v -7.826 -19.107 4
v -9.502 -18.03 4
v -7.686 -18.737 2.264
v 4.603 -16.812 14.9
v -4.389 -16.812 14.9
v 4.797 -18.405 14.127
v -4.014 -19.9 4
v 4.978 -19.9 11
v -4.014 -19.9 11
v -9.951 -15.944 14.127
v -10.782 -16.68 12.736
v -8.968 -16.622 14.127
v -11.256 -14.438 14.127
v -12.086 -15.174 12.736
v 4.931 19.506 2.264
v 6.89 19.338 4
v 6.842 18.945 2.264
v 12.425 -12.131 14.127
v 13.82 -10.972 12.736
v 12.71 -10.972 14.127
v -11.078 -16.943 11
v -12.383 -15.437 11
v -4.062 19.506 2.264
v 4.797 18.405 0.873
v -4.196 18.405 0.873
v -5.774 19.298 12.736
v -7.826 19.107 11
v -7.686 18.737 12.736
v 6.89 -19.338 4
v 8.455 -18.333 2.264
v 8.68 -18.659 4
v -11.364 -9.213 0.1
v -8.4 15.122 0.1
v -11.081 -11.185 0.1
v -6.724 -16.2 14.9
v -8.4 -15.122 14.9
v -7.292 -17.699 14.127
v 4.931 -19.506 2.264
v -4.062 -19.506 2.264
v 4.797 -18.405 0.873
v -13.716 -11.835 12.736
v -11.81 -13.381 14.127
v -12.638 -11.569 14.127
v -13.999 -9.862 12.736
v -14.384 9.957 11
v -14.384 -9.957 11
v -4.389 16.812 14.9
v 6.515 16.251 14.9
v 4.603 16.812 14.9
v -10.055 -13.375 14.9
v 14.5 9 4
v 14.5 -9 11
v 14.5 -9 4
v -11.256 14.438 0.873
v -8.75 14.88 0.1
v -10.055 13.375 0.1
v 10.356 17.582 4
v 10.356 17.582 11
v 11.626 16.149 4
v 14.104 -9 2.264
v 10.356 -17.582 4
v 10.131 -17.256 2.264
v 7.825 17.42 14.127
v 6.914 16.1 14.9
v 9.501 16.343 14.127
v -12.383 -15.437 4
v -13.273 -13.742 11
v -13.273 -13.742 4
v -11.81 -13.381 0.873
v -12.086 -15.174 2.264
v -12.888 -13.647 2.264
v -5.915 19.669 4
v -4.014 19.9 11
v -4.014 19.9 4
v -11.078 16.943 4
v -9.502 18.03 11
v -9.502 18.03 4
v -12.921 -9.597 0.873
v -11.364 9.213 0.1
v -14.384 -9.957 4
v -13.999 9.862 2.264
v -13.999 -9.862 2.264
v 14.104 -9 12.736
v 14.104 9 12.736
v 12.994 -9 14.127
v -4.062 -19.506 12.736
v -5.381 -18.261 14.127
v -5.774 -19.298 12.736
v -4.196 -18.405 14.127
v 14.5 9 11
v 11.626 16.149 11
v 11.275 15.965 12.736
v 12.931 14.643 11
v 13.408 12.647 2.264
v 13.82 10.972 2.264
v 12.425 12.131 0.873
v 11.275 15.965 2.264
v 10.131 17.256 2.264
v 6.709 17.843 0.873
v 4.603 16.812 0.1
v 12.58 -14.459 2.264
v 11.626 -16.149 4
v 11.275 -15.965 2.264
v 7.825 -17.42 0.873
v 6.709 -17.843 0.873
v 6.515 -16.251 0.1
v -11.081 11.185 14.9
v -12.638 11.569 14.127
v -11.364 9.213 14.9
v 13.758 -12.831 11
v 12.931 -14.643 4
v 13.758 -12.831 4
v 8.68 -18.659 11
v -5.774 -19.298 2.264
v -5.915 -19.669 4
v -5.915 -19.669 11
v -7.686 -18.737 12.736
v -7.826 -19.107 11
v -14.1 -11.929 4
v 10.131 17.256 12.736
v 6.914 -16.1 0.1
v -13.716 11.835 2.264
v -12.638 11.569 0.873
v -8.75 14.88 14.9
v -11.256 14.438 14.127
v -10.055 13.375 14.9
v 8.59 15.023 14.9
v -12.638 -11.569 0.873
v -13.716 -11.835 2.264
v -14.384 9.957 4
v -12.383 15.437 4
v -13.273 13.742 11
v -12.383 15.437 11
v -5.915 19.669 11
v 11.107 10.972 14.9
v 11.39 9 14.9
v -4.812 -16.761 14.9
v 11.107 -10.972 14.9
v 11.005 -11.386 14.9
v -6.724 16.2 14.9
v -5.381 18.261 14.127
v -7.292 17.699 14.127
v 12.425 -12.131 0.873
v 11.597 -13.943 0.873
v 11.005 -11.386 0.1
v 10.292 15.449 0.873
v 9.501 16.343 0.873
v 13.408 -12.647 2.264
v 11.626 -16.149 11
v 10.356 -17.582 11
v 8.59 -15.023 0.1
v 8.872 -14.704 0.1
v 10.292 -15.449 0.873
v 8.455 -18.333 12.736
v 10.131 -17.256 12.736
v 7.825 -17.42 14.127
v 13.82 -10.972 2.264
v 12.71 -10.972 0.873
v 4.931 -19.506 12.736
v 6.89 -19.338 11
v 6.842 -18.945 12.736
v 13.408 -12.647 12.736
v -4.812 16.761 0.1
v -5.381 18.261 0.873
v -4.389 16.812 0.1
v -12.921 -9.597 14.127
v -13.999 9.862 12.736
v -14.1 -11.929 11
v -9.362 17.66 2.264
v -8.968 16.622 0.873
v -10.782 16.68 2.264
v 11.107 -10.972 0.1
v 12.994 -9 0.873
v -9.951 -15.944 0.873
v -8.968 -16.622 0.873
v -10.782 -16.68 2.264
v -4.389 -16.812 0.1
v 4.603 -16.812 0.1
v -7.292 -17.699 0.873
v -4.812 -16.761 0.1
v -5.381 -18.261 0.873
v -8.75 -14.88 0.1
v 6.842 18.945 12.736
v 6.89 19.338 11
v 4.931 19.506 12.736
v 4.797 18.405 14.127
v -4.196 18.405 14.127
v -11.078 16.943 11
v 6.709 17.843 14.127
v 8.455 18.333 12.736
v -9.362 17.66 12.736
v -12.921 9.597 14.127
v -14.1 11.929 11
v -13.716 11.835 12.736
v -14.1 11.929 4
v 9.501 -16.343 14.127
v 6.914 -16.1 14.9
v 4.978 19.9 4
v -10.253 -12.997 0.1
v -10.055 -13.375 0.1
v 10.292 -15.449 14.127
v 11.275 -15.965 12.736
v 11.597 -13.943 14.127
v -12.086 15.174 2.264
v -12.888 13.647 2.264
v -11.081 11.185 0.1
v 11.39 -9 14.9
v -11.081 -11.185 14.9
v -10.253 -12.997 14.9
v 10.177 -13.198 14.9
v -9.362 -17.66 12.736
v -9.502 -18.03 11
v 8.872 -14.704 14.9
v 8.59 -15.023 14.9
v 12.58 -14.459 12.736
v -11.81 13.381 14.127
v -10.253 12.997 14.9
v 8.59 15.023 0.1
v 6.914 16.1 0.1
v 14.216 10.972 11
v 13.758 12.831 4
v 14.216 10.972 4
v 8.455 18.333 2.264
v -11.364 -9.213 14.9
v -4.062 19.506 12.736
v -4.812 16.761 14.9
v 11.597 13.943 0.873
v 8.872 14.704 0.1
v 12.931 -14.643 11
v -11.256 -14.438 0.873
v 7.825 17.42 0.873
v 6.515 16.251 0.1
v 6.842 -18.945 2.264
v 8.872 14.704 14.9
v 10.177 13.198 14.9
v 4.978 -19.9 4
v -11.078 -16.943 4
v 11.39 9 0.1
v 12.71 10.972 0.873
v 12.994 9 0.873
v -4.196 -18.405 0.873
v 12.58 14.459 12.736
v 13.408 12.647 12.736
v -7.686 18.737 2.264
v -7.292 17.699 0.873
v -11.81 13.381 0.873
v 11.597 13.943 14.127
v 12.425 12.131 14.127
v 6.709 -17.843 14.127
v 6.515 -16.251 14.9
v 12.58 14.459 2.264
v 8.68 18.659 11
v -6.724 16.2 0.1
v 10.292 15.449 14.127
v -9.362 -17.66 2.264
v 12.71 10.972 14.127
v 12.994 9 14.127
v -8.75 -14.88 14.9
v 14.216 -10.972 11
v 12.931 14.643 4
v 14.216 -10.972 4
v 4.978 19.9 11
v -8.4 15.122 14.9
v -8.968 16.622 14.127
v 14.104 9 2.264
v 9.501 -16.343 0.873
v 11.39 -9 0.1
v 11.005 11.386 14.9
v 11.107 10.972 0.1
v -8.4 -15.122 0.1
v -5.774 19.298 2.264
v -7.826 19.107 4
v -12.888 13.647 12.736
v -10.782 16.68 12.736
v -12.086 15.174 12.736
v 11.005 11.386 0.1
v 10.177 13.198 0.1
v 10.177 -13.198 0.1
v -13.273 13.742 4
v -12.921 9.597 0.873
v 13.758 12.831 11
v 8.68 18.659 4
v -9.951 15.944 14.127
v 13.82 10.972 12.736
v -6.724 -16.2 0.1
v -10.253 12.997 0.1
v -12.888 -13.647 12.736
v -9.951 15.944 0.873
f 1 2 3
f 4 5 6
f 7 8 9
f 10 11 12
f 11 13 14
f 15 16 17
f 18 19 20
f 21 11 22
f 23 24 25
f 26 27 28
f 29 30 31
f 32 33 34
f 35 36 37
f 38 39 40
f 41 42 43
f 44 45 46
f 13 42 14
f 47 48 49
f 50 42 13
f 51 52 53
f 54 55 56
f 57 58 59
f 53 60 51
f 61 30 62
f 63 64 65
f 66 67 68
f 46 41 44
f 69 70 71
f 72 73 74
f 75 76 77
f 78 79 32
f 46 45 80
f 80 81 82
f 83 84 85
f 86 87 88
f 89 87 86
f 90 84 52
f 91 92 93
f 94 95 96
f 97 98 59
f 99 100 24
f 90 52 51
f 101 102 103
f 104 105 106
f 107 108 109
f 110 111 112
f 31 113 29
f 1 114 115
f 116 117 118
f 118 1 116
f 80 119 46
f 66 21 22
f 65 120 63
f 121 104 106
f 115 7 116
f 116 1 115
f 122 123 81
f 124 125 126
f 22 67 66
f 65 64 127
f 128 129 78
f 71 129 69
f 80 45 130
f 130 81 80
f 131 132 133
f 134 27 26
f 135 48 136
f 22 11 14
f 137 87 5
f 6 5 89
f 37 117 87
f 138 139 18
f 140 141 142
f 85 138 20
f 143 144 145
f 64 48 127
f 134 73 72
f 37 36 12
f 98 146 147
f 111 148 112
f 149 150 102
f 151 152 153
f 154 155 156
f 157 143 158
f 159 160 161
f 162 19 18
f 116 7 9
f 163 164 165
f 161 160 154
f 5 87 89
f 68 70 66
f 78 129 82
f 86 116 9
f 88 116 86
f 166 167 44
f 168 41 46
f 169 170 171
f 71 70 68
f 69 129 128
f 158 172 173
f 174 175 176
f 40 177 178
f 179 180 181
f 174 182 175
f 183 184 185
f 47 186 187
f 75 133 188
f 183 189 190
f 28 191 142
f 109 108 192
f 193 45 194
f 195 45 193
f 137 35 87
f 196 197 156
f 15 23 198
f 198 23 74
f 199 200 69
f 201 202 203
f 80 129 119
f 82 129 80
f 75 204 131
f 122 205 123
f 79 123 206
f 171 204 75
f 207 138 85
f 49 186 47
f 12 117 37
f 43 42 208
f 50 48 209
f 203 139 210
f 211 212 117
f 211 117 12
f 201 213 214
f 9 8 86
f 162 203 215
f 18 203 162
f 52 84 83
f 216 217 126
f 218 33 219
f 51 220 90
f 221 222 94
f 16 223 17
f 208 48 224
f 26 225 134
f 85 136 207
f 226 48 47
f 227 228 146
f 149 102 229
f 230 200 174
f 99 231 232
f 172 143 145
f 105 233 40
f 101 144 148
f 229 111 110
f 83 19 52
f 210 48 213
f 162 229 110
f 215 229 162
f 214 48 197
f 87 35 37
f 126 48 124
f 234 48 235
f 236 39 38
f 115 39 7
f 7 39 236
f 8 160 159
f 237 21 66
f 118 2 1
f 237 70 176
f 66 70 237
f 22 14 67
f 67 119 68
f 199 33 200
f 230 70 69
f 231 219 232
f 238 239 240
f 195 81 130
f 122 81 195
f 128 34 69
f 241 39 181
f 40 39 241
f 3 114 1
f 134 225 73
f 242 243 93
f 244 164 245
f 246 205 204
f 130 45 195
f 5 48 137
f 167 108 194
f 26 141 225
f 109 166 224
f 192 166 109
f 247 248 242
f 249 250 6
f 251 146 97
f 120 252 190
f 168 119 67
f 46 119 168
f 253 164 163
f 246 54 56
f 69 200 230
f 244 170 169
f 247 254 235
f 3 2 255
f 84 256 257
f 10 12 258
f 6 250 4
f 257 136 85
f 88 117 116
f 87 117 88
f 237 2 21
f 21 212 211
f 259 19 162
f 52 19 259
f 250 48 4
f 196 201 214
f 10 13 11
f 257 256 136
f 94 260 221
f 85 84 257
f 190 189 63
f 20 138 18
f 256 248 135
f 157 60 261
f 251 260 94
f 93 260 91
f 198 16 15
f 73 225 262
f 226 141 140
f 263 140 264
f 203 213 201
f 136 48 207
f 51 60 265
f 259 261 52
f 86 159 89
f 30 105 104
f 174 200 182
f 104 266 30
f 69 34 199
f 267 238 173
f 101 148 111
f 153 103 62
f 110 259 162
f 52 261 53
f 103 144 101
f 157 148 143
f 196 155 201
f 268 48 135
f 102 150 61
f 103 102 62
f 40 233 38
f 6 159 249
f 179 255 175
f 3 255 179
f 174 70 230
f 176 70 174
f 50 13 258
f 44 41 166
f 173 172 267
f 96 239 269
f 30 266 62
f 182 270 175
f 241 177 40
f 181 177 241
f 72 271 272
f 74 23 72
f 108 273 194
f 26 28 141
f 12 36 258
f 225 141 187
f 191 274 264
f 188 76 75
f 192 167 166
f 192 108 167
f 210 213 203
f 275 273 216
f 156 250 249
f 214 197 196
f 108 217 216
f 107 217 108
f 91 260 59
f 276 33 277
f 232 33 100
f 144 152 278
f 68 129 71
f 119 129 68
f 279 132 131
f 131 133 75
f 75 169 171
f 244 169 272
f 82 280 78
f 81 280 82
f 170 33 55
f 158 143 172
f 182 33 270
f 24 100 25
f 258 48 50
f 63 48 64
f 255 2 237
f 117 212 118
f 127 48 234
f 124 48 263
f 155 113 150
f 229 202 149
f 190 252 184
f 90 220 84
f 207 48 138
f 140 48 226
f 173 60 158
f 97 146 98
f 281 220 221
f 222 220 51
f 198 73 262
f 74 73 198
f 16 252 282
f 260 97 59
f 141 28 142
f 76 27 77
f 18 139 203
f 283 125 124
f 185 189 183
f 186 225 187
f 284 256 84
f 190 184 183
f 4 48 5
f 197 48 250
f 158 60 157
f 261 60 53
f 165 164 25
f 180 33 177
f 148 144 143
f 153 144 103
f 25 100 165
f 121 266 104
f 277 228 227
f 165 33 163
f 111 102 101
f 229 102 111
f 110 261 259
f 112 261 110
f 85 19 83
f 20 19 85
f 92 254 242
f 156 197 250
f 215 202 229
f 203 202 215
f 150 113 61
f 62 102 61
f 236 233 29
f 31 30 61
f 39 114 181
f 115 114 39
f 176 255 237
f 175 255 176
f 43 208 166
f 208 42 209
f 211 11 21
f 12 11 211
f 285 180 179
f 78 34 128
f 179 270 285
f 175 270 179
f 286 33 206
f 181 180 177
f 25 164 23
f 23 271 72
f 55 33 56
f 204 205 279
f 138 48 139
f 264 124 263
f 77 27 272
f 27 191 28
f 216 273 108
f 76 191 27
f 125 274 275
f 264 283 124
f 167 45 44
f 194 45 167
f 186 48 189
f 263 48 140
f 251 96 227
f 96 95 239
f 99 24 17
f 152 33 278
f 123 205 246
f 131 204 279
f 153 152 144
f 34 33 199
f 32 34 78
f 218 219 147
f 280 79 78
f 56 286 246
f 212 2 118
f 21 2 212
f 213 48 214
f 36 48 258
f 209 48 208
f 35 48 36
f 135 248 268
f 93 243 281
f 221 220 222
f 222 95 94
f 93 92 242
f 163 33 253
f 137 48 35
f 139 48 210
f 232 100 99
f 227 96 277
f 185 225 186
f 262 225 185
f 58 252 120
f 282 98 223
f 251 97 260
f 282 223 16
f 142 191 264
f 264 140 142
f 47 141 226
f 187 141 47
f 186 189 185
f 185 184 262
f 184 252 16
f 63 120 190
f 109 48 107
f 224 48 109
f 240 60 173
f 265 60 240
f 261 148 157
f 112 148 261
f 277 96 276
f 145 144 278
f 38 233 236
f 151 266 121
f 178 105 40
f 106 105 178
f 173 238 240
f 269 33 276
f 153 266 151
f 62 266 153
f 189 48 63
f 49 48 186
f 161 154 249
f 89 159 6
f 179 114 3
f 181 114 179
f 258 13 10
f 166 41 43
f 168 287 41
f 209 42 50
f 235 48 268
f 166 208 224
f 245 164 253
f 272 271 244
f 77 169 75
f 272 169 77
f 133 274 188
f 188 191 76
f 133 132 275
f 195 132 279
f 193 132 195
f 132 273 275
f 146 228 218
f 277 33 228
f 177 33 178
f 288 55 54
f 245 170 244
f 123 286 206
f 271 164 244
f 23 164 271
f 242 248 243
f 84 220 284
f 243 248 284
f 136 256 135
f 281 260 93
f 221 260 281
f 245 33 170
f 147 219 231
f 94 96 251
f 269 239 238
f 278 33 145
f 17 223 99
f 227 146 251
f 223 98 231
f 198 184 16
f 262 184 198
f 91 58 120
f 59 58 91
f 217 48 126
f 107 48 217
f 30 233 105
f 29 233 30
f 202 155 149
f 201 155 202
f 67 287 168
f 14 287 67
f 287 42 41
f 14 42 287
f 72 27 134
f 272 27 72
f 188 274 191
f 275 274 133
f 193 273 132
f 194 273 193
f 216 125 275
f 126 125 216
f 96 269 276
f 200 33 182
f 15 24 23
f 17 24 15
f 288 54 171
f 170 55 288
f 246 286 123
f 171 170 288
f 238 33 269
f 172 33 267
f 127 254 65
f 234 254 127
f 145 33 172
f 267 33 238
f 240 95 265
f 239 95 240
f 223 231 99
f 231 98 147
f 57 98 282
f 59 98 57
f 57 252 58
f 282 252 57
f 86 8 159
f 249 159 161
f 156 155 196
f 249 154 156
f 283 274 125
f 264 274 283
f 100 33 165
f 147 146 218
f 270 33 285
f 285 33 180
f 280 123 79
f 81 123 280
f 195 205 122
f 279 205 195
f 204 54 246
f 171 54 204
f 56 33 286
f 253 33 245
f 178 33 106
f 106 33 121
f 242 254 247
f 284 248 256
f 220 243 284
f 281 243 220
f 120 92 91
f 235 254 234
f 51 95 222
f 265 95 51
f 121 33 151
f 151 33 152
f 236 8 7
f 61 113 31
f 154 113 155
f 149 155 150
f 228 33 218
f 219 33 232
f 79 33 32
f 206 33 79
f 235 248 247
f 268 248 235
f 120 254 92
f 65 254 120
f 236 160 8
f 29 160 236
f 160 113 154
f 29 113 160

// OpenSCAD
R = 7;
bumperTHICK = 15;
bumperDIM = [ 29 , 40 , bumperTHICK ] ;
//color("blue")  translate( [ 0 , 0 , 0] )   rounded_box( bumperDIM , R  );
color("red")  smooth_box( bumperDIM , R   );

module smooth_box(d, r, s=4) {//smooth_box with consistent dimensions and alignment
	if(s == 0) {//no edge smoothing, use standard rounded_box
		translate( [ -d[0]/2 , -d[1]/2 , 0 ] )
		linear_extrude(height = d[2] )
		minkowski() {
			translate([r,r]) square([d[0]-2*r, d[1]-2*r]);// ////
			circle(r);// ////
			}
	} else {//use 3D minkowski with dimension and position compensation
		translate( [ -d[0]/2 + s , -d[1]/2 + s , s ] )//compensate for sphere offset
		minkowski() {//3D minkowski with sphere
			linear_extrude(height = d[2] - 2*s )//reduce height for sphere
			minkowski() {//2D minkowski for corners
				translate([r,r]) square([d[0]-2*r-2*s, d[1]-2*r-2*s]);// ////compensate for sphere
				circle(r);// ////
				}
			sphere(r = s);// ////sphere for edge smoothing
			}
		}
	}
module rounded_box(d,r) {//// //////
	translate( [ -d[0]/2 , -d[1]/2 , 0 ] )
	linear_extrude(height = d[2] )
	minkowski() {//// //////
		translate([r,r]) square([d[0]-2*r, d[1]-2*r]);// ////
		circle(r);// ////
		}//// //////
	}//// //////
